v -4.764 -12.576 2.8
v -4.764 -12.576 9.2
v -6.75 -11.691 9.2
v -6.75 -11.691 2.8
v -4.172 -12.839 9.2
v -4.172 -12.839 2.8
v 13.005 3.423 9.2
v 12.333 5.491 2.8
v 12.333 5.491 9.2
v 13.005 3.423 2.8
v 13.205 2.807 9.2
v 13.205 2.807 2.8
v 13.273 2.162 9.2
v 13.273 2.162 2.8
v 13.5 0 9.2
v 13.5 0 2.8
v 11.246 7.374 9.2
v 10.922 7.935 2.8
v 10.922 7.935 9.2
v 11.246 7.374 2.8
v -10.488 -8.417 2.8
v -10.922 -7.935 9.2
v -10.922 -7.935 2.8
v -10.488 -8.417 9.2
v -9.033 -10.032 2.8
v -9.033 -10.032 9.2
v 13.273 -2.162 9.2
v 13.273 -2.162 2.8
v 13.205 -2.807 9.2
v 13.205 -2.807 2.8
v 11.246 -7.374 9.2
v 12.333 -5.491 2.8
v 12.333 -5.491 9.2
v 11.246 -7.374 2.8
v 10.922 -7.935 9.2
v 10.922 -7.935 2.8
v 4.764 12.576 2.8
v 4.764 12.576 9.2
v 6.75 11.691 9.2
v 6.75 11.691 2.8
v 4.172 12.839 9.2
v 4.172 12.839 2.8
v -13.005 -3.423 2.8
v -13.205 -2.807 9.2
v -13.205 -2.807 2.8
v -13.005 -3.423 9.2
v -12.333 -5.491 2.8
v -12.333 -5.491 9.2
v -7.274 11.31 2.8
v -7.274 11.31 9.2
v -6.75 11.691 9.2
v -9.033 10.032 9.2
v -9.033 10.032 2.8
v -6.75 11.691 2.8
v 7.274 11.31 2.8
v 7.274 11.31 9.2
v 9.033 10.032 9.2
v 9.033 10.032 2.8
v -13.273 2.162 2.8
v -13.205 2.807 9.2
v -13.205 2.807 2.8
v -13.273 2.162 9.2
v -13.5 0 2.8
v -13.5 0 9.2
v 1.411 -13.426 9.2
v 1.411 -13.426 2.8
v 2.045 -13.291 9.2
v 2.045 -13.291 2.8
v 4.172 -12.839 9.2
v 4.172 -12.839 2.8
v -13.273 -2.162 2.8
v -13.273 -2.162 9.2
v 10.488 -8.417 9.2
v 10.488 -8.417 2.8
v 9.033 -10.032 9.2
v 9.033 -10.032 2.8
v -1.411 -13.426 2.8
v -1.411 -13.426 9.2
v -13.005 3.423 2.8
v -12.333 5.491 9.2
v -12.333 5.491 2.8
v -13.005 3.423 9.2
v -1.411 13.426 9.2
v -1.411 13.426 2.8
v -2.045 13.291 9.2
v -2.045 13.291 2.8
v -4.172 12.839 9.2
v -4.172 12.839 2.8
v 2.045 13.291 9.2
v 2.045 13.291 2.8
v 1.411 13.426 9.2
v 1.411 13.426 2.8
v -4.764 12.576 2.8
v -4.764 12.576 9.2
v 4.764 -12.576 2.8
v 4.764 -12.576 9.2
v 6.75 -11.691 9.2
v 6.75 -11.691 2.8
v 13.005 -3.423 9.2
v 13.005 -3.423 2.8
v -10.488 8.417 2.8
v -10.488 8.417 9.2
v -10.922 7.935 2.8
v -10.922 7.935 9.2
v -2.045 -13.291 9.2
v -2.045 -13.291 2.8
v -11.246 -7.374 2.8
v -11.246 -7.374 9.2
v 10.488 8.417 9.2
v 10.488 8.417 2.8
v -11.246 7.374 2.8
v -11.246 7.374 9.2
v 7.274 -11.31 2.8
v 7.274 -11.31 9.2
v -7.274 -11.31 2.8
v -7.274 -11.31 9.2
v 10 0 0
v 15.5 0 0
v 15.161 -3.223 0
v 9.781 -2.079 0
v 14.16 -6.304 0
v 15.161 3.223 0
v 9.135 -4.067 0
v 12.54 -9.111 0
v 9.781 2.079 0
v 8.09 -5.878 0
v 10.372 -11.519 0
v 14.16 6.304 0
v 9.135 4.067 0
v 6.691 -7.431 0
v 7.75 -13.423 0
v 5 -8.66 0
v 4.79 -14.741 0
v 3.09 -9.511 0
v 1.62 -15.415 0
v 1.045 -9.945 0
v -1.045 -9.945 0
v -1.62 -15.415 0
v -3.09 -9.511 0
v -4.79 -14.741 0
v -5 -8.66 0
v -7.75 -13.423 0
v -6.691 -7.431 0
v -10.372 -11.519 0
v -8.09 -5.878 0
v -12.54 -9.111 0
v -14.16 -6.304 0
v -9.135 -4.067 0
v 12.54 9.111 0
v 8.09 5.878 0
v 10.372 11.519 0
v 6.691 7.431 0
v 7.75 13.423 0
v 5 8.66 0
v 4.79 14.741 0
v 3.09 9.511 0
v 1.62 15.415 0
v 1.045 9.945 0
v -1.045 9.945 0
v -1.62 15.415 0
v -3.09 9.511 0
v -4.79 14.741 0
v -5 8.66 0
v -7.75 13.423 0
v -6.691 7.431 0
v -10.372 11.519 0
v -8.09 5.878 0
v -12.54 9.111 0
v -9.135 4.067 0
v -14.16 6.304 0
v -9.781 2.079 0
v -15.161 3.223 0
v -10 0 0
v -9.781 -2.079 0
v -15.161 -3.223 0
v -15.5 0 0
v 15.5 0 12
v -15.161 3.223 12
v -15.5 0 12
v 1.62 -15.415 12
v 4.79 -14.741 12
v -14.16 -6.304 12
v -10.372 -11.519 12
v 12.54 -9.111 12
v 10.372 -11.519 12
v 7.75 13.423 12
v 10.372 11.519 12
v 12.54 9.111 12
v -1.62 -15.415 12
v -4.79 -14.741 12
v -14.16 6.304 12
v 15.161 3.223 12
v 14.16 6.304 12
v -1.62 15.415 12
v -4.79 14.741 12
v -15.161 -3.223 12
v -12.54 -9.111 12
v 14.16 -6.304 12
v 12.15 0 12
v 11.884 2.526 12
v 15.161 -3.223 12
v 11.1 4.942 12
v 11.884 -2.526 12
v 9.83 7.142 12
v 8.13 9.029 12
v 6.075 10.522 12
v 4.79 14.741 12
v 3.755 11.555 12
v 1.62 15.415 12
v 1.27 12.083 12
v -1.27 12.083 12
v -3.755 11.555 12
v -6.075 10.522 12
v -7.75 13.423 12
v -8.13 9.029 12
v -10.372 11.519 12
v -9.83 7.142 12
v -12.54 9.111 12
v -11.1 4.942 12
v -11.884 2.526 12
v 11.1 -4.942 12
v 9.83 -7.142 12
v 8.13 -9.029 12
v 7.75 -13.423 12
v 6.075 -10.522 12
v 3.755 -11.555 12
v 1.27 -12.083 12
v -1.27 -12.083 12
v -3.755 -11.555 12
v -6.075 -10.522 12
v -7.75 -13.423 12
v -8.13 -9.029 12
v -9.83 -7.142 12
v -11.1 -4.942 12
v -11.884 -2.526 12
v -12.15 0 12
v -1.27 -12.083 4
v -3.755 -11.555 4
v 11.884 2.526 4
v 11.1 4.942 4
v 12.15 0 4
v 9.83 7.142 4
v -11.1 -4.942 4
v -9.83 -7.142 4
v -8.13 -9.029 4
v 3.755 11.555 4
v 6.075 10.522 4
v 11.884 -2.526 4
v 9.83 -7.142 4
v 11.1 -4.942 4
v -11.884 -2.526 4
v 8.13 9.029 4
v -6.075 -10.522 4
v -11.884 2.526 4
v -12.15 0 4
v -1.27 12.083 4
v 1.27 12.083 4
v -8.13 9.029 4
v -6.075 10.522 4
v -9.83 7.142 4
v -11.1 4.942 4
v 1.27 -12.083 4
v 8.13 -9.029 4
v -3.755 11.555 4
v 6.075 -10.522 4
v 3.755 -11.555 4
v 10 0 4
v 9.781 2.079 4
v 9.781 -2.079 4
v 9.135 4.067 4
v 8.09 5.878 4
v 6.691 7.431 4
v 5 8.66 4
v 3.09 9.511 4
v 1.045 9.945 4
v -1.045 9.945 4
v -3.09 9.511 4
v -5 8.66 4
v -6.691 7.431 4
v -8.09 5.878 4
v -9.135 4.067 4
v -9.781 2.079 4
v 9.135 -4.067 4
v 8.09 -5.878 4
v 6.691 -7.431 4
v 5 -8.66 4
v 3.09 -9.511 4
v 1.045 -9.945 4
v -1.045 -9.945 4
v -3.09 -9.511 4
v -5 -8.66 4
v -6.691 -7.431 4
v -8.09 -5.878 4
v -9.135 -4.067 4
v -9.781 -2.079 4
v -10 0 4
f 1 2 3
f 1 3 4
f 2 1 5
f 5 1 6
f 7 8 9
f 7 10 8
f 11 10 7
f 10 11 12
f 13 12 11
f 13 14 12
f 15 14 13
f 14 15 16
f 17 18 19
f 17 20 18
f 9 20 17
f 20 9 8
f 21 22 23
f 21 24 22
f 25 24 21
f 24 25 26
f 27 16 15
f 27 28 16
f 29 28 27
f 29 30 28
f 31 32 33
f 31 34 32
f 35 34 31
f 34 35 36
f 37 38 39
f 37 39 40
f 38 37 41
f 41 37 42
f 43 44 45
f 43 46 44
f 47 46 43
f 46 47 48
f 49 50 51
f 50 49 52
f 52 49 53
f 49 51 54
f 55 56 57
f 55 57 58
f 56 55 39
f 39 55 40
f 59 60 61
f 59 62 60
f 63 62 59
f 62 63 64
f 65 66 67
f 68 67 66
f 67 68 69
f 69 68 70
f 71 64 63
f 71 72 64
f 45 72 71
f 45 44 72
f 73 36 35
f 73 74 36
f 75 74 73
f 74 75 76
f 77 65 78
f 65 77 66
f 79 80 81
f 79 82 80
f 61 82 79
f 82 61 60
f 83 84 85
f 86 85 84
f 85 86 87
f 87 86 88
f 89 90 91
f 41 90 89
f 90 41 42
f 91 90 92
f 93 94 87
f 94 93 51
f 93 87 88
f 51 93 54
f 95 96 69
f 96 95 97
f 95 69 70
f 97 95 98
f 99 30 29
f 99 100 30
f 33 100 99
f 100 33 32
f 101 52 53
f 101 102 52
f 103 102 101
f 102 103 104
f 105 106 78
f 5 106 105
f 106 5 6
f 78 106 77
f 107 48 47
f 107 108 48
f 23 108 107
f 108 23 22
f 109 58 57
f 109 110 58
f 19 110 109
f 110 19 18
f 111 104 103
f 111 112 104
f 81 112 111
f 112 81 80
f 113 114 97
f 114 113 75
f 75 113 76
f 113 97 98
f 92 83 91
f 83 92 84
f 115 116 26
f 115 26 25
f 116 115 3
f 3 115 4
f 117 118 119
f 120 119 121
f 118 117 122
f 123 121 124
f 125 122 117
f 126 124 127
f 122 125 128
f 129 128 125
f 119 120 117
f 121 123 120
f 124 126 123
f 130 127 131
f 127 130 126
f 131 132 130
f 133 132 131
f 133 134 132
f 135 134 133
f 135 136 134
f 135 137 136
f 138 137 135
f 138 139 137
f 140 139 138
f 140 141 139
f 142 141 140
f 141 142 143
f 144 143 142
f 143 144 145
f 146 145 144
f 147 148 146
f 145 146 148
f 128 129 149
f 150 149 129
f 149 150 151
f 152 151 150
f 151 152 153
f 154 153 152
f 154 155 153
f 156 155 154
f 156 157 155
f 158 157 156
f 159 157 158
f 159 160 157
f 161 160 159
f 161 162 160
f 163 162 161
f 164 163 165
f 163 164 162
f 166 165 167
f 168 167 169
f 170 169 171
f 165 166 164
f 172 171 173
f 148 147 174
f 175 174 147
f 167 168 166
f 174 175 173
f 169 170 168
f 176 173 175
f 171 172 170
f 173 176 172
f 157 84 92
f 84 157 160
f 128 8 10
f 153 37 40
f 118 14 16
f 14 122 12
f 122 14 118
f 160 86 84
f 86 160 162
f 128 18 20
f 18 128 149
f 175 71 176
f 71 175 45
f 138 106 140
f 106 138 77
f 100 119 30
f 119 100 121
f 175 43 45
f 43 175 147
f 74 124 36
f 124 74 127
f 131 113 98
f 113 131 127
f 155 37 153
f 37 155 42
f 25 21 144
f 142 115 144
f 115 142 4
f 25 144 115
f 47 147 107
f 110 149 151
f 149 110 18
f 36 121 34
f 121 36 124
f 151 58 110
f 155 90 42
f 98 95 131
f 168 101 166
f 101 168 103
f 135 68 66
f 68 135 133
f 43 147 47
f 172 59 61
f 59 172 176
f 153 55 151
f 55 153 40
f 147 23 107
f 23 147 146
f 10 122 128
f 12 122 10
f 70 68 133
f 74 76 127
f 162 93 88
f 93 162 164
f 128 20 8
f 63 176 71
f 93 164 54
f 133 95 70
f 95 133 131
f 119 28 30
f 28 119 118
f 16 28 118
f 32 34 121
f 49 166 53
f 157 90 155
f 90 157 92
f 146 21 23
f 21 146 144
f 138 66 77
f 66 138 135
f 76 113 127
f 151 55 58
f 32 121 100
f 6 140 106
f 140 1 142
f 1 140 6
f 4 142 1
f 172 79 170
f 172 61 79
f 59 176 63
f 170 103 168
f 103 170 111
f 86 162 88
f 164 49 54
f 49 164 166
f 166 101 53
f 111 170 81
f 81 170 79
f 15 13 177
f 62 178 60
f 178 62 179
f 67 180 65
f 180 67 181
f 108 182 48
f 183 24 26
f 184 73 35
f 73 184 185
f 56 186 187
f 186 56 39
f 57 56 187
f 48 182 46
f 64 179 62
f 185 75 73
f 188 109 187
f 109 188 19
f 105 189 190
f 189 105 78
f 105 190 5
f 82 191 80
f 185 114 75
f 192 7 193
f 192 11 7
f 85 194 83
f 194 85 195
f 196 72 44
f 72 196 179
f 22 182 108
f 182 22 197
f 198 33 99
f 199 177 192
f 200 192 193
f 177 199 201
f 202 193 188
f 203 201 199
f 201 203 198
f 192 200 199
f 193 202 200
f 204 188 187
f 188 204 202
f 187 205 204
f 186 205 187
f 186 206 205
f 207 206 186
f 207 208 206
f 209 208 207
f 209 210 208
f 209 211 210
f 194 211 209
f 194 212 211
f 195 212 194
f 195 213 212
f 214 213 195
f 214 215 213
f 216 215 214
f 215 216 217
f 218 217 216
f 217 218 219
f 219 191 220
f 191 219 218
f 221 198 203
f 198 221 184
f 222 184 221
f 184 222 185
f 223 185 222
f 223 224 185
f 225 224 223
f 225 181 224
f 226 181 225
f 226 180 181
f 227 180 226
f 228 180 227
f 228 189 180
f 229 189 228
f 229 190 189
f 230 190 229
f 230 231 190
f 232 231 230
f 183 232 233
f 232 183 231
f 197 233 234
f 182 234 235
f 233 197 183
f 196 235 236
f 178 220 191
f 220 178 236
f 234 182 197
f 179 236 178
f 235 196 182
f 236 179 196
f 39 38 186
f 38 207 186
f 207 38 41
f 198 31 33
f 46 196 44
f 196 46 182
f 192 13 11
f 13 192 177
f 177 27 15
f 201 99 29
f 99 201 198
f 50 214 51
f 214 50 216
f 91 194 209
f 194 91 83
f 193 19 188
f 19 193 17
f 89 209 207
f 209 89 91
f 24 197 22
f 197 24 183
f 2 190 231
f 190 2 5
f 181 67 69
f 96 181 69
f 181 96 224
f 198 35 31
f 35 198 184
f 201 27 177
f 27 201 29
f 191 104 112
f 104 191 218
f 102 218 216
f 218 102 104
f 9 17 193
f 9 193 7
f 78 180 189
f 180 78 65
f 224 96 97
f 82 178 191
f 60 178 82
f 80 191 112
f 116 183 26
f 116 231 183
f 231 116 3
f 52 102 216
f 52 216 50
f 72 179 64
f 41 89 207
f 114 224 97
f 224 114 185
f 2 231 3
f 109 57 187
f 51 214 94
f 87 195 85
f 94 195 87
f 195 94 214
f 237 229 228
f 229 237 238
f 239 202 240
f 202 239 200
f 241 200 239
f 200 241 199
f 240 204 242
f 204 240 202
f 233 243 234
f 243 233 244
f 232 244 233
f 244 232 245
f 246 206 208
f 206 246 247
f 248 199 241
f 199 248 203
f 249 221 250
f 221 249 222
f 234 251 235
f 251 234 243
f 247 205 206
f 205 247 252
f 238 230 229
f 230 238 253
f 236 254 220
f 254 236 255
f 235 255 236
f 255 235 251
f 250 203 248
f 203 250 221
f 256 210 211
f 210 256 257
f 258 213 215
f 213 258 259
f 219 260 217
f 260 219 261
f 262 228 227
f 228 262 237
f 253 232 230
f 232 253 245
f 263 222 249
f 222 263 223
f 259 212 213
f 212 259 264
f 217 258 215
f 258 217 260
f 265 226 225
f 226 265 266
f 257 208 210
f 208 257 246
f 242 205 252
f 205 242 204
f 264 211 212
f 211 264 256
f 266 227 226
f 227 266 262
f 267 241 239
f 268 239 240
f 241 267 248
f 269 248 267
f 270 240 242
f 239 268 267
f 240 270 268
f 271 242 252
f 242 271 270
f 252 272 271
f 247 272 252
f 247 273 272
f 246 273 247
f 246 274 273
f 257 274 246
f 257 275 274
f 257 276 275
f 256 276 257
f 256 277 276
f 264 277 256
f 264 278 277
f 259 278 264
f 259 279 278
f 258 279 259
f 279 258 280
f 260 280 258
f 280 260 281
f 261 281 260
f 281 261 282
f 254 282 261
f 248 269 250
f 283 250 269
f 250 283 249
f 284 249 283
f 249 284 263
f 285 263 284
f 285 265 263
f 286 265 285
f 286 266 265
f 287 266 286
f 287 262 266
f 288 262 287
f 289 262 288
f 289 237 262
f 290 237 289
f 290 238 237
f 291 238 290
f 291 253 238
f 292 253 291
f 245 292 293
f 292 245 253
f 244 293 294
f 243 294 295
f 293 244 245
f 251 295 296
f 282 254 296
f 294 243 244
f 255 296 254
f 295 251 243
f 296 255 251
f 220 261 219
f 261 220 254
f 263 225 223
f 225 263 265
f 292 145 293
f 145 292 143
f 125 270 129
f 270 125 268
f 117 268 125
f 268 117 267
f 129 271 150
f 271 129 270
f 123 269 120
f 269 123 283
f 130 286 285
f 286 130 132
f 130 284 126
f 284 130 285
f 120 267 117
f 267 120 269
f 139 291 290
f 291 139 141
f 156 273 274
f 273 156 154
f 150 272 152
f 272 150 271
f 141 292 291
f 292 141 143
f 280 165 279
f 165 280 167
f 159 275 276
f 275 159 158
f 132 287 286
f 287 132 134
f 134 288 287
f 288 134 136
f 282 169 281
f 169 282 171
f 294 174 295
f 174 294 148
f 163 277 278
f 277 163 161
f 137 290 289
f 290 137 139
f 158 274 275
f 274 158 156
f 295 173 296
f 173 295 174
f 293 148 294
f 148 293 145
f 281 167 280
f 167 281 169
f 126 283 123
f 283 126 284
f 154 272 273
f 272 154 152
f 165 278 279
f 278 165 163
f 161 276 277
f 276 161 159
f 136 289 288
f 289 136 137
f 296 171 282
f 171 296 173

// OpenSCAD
difference(){
	union(){
		cylinder(r=27/2,h=10);
		cylinder(r1=31/2,r2=26/2,h=3.5);
		translate([0,0,8.5])
			cylinder(r2=31/2,r1=26/2,h=3.5);

	}
	union(){
		translate([0,0,4])cylinder(r=24.3/2,h=8);
		cylinder(r=20/2,h=17);
	}
}
